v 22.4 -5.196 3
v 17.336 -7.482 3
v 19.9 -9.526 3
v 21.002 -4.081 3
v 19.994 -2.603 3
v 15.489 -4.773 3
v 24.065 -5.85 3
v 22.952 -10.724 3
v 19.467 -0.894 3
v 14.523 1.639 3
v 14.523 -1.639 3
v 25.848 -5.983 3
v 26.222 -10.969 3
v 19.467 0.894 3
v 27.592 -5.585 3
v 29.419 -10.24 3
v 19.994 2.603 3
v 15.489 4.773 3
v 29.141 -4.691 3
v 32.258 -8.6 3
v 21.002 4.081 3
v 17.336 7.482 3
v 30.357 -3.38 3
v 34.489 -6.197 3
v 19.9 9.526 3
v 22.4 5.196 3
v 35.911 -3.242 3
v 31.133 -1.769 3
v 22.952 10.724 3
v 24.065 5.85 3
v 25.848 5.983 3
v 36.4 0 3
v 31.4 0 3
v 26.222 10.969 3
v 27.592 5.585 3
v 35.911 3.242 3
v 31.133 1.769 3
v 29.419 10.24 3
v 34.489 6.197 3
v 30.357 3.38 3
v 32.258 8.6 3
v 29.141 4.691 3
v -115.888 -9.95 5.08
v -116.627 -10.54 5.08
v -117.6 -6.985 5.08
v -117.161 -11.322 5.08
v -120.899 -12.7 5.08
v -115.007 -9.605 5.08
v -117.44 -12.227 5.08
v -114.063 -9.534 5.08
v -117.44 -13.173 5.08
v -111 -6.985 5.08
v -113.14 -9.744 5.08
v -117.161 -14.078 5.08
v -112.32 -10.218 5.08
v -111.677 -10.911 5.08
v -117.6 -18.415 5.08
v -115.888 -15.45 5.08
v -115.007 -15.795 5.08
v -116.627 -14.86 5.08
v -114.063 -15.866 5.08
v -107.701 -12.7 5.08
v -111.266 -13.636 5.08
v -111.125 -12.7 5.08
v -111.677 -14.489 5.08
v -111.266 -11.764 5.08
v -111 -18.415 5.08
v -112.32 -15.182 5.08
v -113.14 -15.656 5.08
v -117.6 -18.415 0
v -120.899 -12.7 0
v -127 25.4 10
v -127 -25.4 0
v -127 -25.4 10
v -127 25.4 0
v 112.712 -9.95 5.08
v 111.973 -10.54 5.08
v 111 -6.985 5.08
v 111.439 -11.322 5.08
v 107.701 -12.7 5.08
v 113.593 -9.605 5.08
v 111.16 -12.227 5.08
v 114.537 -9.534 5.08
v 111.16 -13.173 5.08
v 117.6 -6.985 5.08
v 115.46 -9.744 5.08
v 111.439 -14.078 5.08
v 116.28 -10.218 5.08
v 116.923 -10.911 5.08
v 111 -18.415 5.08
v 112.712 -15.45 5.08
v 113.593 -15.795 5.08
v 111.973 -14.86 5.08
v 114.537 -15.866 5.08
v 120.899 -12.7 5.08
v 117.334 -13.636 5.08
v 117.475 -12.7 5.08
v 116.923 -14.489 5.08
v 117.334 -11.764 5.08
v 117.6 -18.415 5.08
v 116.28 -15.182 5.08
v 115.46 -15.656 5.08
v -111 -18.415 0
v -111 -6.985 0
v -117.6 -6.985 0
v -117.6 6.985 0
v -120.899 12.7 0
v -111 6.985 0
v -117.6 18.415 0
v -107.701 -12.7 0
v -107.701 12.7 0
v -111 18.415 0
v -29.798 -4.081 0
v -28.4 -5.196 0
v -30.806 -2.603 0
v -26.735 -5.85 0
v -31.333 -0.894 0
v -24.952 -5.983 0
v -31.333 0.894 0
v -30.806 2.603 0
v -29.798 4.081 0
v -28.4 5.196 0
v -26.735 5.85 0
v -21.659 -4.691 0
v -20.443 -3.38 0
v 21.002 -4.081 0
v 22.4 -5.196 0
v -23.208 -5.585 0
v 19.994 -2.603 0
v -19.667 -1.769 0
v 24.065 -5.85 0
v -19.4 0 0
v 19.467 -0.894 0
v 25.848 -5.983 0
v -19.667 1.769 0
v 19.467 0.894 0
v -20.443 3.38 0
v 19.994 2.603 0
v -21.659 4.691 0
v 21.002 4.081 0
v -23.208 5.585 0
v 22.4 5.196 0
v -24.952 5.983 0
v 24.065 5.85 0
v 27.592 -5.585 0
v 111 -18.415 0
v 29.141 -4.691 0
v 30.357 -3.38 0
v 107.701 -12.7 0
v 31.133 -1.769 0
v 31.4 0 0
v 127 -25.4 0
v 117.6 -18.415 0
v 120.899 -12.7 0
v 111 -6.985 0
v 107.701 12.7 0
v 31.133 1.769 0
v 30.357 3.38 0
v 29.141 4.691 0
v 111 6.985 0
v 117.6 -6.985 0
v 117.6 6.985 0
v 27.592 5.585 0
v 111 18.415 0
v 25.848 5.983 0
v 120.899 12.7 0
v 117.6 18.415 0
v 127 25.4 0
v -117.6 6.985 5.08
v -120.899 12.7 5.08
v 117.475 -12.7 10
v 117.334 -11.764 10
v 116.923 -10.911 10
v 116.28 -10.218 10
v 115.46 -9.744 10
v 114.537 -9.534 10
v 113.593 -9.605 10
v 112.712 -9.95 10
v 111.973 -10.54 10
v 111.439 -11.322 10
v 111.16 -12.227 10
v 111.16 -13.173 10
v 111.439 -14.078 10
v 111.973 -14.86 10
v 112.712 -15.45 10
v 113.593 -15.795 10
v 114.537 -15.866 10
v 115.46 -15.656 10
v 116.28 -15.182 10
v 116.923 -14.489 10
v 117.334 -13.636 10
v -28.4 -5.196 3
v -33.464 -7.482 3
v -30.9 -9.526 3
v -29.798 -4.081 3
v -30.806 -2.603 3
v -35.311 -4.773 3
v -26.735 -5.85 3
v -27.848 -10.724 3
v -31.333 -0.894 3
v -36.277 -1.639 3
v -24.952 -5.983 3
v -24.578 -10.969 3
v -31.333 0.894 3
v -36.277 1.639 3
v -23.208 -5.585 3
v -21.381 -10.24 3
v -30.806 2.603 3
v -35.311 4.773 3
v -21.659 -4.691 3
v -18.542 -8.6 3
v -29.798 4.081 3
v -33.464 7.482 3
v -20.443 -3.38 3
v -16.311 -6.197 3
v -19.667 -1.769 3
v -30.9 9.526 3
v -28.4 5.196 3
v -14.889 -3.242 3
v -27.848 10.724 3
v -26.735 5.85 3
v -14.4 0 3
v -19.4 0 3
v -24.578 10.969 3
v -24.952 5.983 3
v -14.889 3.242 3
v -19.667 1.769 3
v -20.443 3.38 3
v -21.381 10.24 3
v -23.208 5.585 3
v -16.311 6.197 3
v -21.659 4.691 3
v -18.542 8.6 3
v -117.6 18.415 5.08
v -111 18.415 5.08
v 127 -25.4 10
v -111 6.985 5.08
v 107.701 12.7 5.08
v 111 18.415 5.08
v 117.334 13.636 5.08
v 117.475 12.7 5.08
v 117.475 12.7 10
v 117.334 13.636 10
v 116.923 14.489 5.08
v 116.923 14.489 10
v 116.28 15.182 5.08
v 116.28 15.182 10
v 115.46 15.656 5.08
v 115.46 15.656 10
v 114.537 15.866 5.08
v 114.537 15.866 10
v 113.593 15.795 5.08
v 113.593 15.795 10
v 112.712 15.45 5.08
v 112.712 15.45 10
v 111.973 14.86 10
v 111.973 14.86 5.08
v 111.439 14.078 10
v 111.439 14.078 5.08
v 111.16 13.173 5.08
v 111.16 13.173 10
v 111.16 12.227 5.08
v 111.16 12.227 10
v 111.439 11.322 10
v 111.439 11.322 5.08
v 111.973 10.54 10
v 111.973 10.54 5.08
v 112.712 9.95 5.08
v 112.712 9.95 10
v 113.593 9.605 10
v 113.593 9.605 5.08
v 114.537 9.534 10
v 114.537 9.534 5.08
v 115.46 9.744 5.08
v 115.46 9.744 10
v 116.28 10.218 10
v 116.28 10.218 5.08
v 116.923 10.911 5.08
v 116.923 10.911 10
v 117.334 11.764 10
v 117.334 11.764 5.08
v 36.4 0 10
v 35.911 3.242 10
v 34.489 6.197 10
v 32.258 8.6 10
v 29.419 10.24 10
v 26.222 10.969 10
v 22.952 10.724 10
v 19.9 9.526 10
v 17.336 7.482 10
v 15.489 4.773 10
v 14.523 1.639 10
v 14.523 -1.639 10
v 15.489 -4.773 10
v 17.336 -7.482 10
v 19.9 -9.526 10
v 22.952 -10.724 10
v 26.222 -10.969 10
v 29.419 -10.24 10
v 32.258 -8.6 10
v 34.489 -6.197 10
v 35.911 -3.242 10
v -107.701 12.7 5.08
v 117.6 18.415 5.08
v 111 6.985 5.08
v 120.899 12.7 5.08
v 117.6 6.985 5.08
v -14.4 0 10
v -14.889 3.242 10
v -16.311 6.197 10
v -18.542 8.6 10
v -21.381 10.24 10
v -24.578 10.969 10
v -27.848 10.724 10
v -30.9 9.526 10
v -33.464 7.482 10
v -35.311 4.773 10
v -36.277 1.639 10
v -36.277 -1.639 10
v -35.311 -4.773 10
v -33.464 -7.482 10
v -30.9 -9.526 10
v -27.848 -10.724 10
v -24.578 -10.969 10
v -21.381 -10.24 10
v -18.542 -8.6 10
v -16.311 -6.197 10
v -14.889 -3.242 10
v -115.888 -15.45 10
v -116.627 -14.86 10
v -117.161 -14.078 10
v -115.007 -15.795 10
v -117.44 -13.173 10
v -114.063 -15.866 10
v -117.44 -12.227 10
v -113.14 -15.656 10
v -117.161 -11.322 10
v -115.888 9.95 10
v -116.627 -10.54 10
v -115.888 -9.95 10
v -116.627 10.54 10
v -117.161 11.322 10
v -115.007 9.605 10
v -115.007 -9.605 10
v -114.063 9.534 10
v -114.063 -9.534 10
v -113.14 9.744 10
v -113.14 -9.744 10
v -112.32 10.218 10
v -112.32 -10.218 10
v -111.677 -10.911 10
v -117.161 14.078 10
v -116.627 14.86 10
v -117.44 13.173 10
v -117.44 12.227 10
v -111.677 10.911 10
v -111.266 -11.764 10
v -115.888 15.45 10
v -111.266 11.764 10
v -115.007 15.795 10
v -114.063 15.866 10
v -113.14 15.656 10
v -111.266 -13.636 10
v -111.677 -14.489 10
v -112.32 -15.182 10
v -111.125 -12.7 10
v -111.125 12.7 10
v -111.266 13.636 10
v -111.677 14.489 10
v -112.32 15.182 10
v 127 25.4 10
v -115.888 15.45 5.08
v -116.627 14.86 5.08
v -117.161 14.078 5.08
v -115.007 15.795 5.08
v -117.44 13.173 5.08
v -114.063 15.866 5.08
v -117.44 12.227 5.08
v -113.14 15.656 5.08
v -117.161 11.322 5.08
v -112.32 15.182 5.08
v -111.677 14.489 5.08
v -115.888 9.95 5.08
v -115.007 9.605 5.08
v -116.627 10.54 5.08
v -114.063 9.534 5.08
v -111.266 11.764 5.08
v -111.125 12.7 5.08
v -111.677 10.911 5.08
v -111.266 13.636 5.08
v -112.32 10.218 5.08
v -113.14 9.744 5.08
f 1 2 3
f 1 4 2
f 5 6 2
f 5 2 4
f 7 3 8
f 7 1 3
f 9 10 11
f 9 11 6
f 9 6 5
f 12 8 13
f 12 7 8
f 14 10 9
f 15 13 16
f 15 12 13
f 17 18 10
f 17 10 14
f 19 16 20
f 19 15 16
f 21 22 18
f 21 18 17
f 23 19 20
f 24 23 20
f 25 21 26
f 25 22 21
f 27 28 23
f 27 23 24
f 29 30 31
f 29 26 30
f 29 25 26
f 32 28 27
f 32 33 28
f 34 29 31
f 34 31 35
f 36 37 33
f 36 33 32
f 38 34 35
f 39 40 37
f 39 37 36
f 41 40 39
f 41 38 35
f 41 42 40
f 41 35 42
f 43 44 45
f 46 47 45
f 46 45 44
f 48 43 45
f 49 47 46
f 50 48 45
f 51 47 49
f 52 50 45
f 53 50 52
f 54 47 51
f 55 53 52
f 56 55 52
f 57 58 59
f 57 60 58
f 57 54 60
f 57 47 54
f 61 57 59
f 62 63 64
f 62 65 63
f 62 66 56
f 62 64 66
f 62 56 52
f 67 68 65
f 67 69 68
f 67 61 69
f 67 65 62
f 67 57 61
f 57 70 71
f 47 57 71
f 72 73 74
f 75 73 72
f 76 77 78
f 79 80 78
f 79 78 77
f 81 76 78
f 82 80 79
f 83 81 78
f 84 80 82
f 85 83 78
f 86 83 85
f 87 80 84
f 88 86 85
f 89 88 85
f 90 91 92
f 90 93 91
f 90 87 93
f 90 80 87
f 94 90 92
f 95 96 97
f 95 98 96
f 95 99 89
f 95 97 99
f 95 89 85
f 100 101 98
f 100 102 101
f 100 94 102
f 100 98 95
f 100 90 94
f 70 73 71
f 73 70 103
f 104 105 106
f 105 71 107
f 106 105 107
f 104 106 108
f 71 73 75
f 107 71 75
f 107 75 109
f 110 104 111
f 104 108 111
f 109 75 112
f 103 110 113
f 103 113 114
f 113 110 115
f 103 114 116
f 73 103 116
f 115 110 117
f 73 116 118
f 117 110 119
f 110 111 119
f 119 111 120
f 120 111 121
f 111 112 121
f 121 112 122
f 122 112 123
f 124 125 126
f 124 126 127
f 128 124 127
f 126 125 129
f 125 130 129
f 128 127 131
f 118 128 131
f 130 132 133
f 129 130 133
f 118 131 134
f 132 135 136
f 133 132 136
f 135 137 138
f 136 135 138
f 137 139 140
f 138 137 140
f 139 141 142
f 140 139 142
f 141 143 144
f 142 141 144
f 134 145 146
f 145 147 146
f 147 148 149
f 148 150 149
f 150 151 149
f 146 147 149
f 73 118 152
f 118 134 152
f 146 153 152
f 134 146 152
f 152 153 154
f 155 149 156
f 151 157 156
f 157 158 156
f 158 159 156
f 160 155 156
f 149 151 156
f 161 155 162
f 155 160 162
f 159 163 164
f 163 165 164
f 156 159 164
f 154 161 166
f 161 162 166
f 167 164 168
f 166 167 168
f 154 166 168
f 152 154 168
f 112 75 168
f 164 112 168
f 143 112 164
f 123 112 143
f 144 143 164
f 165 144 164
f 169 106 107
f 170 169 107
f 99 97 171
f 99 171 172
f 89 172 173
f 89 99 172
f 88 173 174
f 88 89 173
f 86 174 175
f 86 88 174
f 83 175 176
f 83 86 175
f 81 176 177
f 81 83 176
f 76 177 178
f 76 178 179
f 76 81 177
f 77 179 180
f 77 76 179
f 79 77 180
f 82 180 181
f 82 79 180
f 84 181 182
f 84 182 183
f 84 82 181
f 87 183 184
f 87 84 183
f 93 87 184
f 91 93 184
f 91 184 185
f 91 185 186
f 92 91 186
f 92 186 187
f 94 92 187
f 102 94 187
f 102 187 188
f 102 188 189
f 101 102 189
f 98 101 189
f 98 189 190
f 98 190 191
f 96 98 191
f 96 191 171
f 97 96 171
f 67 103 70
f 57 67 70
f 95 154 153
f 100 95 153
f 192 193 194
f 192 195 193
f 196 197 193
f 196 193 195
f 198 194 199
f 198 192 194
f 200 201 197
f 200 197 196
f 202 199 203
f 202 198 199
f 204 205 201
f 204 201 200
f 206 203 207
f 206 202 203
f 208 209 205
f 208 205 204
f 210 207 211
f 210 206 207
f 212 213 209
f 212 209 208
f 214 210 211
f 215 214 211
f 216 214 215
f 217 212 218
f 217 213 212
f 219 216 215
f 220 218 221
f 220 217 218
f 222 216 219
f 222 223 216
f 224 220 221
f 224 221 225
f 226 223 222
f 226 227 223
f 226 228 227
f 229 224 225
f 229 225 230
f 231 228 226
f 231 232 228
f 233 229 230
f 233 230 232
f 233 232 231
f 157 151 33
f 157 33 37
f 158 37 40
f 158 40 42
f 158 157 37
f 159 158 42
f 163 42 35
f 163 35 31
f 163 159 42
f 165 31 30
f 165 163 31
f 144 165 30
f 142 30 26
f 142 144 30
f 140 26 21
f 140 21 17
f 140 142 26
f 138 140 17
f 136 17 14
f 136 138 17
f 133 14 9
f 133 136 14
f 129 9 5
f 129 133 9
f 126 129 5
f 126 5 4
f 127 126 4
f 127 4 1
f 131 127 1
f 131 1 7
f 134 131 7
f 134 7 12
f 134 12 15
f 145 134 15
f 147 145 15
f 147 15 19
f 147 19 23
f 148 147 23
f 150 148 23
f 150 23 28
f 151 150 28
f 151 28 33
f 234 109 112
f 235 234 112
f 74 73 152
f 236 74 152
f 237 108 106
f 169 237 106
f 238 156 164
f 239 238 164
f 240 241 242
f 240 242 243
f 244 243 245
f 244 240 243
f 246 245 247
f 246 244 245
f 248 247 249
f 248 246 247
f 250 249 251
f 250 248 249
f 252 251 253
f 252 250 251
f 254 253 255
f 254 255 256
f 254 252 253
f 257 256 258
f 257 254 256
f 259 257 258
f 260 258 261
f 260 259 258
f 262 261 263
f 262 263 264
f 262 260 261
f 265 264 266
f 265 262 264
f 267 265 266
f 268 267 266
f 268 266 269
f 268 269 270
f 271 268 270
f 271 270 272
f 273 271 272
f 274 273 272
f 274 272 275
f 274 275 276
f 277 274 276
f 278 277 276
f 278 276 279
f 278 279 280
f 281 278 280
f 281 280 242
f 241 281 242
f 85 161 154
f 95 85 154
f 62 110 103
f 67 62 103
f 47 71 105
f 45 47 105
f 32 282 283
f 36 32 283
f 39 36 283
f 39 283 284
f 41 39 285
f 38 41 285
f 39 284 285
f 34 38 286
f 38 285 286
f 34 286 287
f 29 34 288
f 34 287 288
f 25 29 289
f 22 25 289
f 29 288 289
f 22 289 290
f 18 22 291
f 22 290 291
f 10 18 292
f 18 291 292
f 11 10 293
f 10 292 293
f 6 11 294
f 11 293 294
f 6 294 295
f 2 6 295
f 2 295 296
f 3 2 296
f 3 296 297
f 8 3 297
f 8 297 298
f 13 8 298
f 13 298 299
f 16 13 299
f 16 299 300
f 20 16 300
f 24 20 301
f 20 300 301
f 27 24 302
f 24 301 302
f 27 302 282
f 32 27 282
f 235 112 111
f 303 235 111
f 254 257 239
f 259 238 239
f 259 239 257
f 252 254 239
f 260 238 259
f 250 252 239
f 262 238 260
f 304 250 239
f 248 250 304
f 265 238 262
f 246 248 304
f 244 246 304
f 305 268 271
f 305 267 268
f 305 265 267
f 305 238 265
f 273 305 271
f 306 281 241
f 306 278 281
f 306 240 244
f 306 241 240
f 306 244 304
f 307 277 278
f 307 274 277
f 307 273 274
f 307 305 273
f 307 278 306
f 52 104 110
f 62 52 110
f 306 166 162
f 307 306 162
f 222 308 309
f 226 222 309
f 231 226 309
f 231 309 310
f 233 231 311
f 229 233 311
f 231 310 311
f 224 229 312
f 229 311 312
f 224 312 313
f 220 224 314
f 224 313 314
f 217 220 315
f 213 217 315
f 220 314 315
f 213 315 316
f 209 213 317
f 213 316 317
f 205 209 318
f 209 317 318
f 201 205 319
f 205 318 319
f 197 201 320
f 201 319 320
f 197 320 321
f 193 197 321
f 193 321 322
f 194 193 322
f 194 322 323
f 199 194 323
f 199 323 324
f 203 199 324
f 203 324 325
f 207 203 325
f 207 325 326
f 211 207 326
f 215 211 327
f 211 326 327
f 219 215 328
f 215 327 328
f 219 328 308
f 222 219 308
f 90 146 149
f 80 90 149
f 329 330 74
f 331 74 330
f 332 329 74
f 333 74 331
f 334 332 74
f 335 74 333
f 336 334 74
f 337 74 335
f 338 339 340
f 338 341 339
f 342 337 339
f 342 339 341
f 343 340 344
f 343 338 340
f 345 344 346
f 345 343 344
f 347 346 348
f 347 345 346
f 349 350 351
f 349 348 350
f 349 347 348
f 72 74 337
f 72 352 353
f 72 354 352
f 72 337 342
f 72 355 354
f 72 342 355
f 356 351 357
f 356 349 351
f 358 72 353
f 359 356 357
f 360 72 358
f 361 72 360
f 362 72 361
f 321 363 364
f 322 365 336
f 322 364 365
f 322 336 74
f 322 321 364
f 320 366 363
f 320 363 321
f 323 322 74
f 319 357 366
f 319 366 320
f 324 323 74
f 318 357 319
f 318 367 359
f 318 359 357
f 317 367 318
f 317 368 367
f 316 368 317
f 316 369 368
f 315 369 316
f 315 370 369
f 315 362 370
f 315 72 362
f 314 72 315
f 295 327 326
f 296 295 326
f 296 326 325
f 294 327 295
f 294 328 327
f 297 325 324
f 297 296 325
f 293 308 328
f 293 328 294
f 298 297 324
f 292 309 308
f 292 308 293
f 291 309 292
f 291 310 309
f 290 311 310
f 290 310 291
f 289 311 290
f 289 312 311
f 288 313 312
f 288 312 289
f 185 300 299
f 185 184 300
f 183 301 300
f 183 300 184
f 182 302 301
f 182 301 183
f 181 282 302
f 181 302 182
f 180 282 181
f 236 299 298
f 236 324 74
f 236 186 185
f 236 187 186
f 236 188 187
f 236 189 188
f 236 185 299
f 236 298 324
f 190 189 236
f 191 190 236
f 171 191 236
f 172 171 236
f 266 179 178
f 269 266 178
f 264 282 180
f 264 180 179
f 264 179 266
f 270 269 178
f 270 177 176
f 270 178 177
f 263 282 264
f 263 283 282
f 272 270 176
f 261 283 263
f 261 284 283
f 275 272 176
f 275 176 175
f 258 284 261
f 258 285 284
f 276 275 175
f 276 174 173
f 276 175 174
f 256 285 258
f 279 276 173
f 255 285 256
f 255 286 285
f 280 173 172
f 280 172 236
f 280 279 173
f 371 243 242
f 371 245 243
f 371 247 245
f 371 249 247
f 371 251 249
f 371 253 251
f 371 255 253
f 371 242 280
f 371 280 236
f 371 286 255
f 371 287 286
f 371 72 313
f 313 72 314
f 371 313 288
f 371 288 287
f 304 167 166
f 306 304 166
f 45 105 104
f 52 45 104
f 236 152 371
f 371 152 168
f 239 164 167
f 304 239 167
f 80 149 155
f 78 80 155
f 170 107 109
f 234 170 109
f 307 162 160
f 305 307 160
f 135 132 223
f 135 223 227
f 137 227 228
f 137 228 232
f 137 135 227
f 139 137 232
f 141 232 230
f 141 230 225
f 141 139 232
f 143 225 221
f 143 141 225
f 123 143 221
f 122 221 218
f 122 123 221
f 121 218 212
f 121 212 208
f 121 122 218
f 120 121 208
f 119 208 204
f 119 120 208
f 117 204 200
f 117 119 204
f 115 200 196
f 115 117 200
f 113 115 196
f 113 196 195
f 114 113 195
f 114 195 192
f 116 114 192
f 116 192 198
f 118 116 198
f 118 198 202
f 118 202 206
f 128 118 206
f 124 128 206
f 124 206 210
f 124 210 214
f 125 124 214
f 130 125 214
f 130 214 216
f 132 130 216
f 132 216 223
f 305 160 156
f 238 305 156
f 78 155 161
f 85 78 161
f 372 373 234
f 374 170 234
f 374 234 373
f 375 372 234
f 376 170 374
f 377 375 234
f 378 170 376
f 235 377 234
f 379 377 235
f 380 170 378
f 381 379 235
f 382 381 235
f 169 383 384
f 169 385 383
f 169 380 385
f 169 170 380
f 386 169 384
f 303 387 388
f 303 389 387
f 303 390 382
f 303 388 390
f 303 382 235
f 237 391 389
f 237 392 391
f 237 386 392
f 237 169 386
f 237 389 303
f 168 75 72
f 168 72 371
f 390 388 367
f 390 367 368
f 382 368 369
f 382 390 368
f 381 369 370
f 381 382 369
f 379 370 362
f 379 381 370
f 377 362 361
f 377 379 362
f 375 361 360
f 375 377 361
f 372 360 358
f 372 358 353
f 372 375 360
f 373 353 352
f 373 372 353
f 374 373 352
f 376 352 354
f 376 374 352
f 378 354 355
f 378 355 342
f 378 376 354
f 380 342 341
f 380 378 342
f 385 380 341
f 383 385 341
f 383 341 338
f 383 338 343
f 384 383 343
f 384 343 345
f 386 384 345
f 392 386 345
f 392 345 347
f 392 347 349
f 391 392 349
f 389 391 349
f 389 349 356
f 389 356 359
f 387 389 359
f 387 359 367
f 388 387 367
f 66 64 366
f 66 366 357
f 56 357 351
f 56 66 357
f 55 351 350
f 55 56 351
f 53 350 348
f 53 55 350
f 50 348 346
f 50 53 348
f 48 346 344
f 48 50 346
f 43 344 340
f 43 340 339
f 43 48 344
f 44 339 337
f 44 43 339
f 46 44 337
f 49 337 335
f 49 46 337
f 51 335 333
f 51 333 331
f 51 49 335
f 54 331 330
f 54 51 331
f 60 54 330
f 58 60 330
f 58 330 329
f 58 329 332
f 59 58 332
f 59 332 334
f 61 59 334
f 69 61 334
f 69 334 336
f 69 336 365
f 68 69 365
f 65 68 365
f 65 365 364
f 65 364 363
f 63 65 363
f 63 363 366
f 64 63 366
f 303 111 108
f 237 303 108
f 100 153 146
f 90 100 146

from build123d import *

# Parameters (mm, degrees)
F0_W     = 254
F0_H     = 50.8
F0_R     = 3.175
F0_R_2   = 6
F1_DEPTH = 10
F2_R     = 11
F2_R_2   = 6
F3_DEPTH = 7
F4_R     = 3.175
F5_DEPTH = 5.08


with BuildPart() as f1:
    # F0 (on Top) → F1 (new body)
    with BuildSketch(Plane.XY):
        Rectangle(F0_W, F0_H)
        with Locations((-114.3, -12.7)):
            Circle(F0_R, mode=Mode.SUBTRACT)
        with Locations((-25.4, 0)):
            Circle(F0_R_2, mode=Mode.SUBTRACT)
        with Locations((114.3, -12.7)):
            Circle(F0_R, mode=Mode.SUBTRACT)
        with Locations((25.4, 0)):
            Circle(F0_R_2, mode=Mode.SUBTRACT)
        with Locations((-114.3, 12.7)):
            Circle(F0_R, mode=Mode.SUBTRACT)
        with Locations((114.3, 12.7)):
            Circle(F0_R, mode=Mode.SUBTRACT)
    extrude(amount=F1_DEPTH)

    # F2 (on face) → F3 (cut)
    with BuildSketch(Plane.XY.offset(10)):
        with Locations((-25.4, 0)):
            Circle(F2_R)
        with Locations((-25.4, 0)):
            Circle(F2_R_2, mode=Mode.SUBTRACT)
        with Locations((25.4, 0)):
            Circle(F2_R)
        with Locations((25.4, 0)):
            Circle(F2_R_2, mode=Mode.SUBTRACT)
    extrude(amount=-F3_DEPTH, mode=Mode.SUBTRACT)

    # F4 (on face) → F5 (cut)
    with BuildSketch(Plane(origin=(0, 0, 0), x_dir=(1, 0, 0), z_dir=(0, 0, -1))):
        Polygon((-111.000443, 18.415), (-117.599557, 18.415), (-120.899114, 12.7), (-117.599557, 6.985), (-111.000443, 6.985), (-107.700886, 12.7), align=None)
        with Locations((-114.3, 12.7)):
            Circle(F4_R, mode=Mode.SUBTRACT)
        Polygon((-111.000443, -6.985), (-117.599557, -6.985), (-120.899114, -12.7), (-117.599557, -18.415), (-111.000443, -18.415), (-107.700886, -12.7), align=None)
        with Locations((-114.3, -12.7)):
            Circle(F4_R, mode=Mode.SUBTRACT)
        Polygon((117.599557, -6.985), (111.000443, -6.985), (107.700886, -12.7), (111.000443, -18.415), (117.599557, -18.415), (120.899114, -12.7), align=None)
        with Locations((114.3, -12.7)):
            Circle(F4_R, mode=Mode.SUBTRACT)
        Polygon((117.599557, 18.415), (111.000443, 18.415), (107.700886, 12.7), (111.000443, 6.985), (117.599557, 6.985), (120.899114, 12.7), align=None)
        with Locations((114.3, 12.7)):
            Circle(F4_R, mode=Mode.SUBTRACT)
    extrude(amount=-F5_DEPTH, mode=Mode.SUBTRACT)


solid = f1.part
